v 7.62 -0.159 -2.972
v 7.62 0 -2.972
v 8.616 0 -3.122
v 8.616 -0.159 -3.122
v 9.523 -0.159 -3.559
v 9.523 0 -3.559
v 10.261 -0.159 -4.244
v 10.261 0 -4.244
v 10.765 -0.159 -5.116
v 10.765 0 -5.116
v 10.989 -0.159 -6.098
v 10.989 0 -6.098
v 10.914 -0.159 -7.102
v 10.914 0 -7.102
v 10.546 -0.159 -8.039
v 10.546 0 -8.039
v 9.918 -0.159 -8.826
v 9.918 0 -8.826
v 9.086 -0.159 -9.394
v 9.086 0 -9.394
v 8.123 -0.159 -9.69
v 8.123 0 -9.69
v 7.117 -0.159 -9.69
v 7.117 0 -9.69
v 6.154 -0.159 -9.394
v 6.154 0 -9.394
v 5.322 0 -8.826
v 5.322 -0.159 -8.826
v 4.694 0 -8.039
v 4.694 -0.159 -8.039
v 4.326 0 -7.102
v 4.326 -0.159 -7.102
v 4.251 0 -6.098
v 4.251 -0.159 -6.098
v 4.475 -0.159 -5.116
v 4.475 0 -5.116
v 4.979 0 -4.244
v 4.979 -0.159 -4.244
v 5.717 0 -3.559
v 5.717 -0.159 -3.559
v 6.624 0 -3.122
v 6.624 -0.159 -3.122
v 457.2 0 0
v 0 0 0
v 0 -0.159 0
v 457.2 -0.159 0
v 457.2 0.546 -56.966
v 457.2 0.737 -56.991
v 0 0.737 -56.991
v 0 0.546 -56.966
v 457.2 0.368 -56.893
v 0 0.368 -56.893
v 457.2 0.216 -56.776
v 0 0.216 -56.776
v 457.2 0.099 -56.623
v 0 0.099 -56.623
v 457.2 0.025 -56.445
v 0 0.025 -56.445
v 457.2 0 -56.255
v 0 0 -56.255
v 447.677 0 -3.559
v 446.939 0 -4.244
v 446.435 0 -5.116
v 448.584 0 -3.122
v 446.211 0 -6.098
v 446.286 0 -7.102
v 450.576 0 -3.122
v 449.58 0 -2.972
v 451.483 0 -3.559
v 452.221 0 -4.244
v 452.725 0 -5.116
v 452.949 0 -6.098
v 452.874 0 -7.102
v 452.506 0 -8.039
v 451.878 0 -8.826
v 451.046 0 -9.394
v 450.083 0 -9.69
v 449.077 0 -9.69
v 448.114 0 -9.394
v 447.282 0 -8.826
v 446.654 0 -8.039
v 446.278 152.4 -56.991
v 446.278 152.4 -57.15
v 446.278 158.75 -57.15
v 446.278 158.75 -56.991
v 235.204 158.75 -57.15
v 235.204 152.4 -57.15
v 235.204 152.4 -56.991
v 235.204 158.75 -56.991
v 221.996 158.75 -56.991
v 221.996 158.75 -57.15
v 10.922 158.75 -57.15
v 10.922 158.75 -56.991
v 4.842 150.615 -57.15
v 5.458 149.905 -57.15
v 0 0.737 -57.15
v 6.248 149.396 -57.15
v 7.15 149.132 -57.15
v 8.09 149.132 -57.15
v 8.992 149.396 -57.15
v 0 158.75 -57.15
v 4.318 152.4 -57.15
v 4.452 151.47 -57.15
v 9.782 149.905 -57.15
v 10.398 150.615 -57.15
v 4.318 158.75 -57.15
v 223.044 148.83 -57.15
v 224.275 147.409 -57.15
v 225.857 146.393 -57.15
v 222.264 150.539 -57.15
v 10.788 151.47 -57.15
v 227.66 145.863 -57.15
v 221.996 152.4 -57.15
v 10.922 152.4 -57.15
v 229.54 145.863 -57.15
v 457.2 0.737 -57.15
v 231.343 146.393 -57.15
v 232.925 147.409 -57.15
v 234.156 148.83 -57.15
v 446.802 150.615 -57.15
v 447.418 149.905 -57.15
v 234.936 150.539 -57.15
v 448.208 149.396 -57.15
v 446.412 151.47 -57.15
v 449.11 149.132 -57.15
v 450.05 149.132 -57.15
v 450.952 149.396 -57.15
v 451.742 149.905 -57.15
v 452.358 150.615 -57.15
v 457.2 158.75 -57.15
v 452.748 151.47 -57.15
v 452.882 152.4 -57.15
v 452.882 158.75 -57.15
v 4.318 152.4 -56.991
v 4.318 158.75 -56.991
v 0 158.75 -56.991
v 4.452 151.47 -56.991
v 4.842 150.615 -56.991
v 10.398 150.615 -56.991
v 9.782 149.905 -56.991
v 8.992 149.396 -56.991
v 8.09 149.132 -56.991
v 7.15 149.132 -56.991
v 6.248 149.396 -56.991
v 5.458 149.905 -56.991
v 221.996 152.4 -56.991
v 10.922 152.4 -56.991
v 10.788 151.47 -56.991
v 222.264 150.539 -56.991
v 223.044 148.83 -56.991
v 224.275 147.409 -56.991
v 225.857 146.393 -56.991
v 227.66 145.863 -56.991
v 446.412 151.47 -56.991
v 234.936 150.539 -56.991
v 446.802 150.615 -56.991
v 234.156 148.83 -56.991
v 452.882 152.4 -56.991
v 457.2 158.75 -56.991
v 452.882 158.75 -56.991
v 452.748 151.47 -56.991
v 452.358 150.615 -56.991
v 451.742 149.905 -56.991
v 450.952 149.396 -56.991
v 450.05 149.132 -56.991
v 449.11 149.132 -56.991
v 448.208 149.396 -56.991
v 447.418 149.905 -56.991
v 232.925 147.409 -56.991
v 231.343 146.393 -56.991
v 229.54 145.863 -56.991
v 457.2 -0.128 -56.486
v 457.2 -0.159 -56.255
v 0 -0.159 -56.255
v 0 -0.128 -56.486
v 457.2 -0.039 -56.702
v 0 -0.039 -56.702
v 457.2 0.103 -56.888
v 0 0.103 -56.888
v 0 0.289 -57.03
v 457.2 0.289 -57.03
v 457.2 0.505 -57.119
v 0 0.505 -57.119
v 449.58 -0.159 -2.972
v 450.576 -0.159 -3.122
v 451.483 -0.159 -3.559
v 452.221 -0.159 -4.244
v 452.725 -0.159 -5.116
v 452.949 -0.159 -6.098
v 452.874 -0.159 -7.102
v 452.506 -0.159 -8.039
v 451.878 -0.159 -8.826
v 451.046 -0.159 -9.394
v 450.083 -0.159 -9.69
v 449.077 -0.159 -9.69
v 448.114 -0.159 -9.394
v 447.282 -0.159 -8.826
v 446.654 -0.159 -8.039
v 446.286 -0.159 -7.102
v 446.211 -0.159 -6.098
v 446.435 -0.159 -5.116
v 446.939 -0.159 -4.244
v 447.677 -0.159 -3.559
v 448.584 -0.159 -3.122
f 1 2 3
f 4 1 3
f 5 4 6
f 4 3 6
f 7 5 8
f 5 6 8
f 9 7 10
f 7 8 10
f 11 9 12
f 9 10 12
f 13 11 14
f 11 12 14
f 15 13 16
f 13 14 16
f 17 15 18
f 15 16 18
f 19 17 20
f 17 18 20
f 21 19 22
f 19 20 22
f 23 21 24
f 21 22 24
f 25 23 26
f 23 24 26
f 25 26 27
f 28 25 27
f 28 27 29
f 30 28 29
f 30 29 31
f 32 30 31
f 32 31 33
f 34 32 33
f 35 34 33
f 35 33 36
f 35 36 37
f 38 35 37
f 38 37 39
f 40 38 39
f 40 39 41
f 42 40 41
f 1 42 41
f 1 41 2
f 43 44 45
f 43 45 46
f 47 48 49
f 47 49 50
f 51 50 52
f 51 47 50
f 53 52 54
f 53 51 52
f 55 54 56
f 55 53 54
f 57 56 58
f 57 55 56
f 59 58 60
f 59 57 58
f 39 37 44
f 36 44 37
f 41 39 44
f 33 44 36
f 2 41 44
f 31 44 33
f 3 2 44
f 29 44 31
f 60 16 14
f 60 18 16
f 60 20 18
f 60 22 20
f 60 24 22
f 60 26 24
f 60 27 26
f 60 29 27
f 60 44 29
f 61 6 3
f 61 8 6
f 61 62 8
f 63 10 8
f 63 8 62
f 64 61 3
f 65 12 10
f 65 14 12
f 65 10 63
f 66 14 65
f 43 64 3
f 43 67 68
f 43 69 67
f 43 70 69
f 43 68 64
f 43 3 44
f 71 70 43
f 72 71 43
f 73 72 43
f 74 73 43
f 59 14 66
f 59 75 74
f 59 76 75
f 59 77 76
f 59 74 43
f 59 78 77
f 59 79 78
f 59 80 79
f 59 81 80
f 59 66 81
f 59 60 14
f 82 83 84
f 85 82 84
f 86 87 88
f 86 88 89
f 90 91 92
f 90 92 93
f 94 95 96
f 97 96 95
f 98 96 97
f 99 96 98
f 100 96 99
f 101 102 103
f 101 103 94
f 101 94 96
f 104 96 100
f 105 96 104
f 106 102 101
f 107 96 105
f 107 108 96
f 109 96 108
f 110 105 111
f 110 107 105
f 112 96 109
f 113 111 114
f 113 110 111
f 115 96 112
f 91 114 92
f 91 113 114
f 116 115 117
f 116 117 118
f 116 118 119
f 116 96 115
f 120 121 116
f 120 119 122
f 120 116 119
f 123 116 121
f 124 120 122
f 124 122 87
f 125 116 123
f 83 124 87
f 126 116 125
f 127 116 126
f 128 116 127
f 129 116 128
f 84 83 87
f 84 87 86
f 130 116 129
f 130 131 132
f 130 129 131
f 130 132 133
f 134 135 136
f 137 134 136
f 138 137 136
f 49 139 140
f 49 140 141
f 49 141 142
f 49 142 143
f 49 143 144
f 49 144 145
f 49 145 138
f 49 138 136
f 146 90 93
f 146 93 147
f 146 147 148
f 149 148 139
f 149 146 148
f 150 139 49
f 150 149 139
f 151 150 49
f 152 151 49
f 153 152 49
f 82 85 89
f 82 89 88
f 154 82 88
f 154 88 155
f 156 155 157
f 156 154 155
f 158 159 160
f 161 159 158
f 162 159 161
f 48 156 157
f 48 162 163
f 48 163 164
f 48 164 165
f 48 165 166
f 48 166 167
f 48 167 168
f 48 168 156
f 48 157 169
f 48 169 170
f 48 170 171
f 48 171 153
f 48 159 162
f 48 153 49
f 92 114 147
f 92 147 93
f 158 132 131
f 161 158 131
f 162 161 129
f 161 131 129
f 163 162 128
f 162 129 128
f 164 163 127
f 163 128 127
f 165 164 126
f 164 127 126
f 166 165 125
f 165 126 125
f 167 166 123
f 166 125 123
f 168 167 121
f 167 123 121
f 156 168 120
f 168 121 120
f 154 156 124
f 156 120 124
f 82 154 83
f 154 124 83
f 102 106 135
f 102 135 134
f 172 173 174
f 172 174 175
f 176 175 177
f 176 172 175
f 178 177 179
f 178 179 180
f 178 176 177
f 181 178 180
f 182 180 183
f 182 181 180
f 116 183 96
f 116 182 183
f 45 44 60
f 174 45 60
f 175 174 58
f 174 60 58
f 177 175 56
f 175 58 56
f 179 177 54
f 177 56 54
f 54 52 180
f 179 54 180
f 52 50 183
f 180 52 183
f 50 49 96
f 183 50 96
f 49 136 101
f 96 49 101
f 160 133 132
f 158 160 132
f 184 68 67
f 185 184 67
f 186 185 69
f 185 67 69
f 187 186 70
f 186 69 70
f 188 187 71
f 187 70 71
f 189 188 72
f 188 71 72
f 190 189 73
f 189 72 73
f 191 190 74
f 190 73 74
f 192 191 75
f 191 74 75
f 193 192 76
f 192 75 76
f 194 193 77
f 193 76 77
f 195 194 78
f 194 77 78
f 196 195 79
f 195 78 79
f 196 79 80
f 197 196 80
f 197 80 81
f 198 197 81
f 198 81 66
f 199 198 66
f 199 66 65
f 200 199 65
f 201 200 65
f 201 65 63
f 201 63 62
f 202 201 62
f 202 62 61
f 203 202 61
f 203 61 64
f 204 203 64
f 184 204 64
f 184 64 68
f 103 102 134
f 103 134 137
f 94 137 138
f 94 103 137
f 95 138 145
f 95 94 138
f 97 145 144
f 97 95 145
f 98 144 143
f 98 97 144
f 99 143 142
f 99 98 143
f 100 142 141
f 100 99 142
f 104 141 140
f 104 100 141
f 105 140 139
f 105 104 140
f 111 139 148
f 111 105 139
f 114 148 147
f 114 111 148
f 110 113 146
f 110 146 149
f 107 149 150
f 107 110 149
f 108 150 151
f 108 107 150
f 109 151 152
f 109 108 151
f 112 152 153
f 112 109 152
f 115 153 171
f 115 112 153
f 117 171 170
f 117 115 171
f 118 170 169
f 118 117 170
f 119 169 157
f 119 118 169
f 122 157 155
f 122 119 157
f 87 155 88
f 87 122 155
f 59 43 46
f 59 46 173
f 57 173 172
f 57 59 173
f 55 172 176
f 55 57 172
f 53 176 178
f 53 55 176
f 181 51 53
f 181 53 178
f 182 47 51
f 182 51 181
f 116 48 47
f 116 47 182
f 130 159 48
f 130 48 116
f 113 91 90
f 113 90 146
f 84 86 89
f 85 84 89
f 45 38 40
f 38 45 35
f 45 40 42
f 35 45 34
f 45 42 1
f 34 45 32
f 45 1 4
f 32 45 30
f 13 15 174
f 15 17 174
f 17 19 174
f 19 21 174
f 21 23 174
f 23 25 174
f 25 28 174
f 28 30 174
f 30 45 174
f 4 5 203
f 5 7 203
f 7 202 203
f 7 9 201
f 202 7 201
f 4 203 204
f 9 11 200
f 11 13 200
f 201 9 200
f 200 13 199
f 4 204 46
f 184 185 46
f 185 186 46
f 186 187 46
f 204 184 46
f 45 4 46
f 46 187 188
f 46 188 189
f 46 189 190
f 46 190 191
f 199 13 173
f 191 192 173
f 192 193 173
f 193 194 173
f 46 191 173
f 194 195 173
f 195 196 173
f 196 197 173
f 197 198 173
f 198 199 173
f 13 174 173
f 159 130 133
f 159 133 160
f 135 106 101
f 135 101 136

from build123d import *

# Parameters (mm, degrees)
SKETCH1_W                    = 457.2
SKETCH1_H                    = 57.15
BASE_FLANGE1_DEPTH           = 0.15875
EDGE_FLANGE1_STRIP_W         = 2.1082
EDGE_FLANGE1_STRIP_H         = 0.15875
EDGE_FLANGE1_STRIP_CUT_DEPTH = 457.2
EDGE_FLANGE1_DEPTH           = 457.2
CUT_EXTRUDE1_DEPTH           = 488.3392299
F_1_4_CLEARANCE_HOLE2_D      = 6.7564
F_1_4_CLEARANCE_HOLE2_DEPTH  = 25.4
F_1_4_CLEARANCE_HOLE2_TIP    = 2.029827343


# Sheet-metal steps are written as plain solids
with BuildPart() as part:
    # Sketch1 → Base-Flange1 (new body)
    with BuildSketch(Plane(origin=(0, 0, 0), x_dir=(1, 0, 0), z_dir=(0, 1, 0))):
        with Locations((228.6, 28.575)):
            Rectangle(SKETCH1_W, SKETCH1_H)
    extrude(amount=-BASE_FLANGE1_DEPTH)

    # Edge-Flange1 strip (across the edge) → Edge-Flange1 strip cut (cut)
    with BuildSketch(Plane(origin=(457.2, 0, -57.15), x_dir=(0, 0, 1), z_dir=(-1, 0, 0))):
        with Locations((-0.15875, -0.079375)):
            Rectangle(EDGE_FLANGE1_STRIP_W, EDGE_FLANGE1_STRIP_H)
    extrude(amount=EDGE_FLANGE1_STRIP_CUT_DEPTH, mode=Mode.SUBTRACT)

    # Edge-Flange1 section (across the edge) → Edge-Flange1 (add)
    with BuildSketch(Plane(origin=(457.2, 0, -57.15), x_dir=(0, 0, 1), z_dir=(-1, 0, 0))):
        with BuildLine():
            Line((0, 0.7366), (0, 158.75))
            Line((0, 158.75), (0.15875, 158.75))
            Line((0.15875, 158.75), (0.15875, 0.7366))
            ThreePointArc((0.15875, 0.7366), (0.374495145, 0.215745145), (0.89535, 0))
            Line((0.89535, 0), (0.89535, -0.15875))
            ThreePointArc((0.89535, -0.15875), (0.262241943, 0.103491943), (0, 0.7366))
        make_face()
    extrude(amount=EDGE_FLANGE1_DEPTH)

    # Sketch9 → Cut-Extrude1 (cut, through all)
    with BuildSketch(Plane(origin=(0, 0, -57.15), x_dir=(-1, 0, 0), z_dir=(0, 0, -1))):
        with BuildLine():
            Line((-446.278, 152.4), (-446.278, 158.75))
            Line((-446.278, 158.75), (-452.882, 158.75))
            Line((-452.882, 158.75), (-452.882, 152.4))
            ThreePointArc((-452.882, 152.4), (-449.58, 149.098), (-446.278, 152.4))
        make_face()
        with BuildLine():
            Line((-10.922, 152.4), (-10.922, 158.75))
            Line((-10.922, 158.75), (-4.318, 158.75))
            Line((-4.318, 158.75), (-4.318, 152.4))
            ThreePointArc((-4.318, 152.4), (-7.62, 149.098), (-10.922, 152.4))
        make_face()
        with BuildLine():
            Line((-235.204, 152.4), (-235.204, 158.75))
            Line((-235.204, 158.75), (-221.996, 158.75))
            Line((-221.996, 158.75), (-221.996, 152.4))
            ThreePointArc((-221.996, 152.4), (-228.6, 145.796), (-235.204, 152.4))
        make_face()
    extrude(amount=-CUT_EXTRUDE1_DEPTH, mode=Mode.SUBTRACT)

    # 1/4 Clearance Hole2
    with Locations(Plane(origin=(7.62, -0.15875, -6.35), x_dir=(0, 0, -1), z_dir=(0, -1, 0))):
        with Locations((0, 0), (0, 441.96)):
            Hole(F_1_4_CLEARANCE_HOLE2_D / 2, depth=F_1_4_CLEARANCE_HOLE2_DEPTH)
            with Locations((0, 0, -(F_1_4_CLEARANCE_HOLE2_DEPTH + F_1_4_CLEARANCE_HOLE2_TIP / 2))):  # 118° drill point
                Cone(0, F_1_4_CLEARANCE_HOLE2_D / 2, F_1_4_CLEARANCE_HOLE2_TIP, mode=Mode.SUBTRACT)


solid = part.part
